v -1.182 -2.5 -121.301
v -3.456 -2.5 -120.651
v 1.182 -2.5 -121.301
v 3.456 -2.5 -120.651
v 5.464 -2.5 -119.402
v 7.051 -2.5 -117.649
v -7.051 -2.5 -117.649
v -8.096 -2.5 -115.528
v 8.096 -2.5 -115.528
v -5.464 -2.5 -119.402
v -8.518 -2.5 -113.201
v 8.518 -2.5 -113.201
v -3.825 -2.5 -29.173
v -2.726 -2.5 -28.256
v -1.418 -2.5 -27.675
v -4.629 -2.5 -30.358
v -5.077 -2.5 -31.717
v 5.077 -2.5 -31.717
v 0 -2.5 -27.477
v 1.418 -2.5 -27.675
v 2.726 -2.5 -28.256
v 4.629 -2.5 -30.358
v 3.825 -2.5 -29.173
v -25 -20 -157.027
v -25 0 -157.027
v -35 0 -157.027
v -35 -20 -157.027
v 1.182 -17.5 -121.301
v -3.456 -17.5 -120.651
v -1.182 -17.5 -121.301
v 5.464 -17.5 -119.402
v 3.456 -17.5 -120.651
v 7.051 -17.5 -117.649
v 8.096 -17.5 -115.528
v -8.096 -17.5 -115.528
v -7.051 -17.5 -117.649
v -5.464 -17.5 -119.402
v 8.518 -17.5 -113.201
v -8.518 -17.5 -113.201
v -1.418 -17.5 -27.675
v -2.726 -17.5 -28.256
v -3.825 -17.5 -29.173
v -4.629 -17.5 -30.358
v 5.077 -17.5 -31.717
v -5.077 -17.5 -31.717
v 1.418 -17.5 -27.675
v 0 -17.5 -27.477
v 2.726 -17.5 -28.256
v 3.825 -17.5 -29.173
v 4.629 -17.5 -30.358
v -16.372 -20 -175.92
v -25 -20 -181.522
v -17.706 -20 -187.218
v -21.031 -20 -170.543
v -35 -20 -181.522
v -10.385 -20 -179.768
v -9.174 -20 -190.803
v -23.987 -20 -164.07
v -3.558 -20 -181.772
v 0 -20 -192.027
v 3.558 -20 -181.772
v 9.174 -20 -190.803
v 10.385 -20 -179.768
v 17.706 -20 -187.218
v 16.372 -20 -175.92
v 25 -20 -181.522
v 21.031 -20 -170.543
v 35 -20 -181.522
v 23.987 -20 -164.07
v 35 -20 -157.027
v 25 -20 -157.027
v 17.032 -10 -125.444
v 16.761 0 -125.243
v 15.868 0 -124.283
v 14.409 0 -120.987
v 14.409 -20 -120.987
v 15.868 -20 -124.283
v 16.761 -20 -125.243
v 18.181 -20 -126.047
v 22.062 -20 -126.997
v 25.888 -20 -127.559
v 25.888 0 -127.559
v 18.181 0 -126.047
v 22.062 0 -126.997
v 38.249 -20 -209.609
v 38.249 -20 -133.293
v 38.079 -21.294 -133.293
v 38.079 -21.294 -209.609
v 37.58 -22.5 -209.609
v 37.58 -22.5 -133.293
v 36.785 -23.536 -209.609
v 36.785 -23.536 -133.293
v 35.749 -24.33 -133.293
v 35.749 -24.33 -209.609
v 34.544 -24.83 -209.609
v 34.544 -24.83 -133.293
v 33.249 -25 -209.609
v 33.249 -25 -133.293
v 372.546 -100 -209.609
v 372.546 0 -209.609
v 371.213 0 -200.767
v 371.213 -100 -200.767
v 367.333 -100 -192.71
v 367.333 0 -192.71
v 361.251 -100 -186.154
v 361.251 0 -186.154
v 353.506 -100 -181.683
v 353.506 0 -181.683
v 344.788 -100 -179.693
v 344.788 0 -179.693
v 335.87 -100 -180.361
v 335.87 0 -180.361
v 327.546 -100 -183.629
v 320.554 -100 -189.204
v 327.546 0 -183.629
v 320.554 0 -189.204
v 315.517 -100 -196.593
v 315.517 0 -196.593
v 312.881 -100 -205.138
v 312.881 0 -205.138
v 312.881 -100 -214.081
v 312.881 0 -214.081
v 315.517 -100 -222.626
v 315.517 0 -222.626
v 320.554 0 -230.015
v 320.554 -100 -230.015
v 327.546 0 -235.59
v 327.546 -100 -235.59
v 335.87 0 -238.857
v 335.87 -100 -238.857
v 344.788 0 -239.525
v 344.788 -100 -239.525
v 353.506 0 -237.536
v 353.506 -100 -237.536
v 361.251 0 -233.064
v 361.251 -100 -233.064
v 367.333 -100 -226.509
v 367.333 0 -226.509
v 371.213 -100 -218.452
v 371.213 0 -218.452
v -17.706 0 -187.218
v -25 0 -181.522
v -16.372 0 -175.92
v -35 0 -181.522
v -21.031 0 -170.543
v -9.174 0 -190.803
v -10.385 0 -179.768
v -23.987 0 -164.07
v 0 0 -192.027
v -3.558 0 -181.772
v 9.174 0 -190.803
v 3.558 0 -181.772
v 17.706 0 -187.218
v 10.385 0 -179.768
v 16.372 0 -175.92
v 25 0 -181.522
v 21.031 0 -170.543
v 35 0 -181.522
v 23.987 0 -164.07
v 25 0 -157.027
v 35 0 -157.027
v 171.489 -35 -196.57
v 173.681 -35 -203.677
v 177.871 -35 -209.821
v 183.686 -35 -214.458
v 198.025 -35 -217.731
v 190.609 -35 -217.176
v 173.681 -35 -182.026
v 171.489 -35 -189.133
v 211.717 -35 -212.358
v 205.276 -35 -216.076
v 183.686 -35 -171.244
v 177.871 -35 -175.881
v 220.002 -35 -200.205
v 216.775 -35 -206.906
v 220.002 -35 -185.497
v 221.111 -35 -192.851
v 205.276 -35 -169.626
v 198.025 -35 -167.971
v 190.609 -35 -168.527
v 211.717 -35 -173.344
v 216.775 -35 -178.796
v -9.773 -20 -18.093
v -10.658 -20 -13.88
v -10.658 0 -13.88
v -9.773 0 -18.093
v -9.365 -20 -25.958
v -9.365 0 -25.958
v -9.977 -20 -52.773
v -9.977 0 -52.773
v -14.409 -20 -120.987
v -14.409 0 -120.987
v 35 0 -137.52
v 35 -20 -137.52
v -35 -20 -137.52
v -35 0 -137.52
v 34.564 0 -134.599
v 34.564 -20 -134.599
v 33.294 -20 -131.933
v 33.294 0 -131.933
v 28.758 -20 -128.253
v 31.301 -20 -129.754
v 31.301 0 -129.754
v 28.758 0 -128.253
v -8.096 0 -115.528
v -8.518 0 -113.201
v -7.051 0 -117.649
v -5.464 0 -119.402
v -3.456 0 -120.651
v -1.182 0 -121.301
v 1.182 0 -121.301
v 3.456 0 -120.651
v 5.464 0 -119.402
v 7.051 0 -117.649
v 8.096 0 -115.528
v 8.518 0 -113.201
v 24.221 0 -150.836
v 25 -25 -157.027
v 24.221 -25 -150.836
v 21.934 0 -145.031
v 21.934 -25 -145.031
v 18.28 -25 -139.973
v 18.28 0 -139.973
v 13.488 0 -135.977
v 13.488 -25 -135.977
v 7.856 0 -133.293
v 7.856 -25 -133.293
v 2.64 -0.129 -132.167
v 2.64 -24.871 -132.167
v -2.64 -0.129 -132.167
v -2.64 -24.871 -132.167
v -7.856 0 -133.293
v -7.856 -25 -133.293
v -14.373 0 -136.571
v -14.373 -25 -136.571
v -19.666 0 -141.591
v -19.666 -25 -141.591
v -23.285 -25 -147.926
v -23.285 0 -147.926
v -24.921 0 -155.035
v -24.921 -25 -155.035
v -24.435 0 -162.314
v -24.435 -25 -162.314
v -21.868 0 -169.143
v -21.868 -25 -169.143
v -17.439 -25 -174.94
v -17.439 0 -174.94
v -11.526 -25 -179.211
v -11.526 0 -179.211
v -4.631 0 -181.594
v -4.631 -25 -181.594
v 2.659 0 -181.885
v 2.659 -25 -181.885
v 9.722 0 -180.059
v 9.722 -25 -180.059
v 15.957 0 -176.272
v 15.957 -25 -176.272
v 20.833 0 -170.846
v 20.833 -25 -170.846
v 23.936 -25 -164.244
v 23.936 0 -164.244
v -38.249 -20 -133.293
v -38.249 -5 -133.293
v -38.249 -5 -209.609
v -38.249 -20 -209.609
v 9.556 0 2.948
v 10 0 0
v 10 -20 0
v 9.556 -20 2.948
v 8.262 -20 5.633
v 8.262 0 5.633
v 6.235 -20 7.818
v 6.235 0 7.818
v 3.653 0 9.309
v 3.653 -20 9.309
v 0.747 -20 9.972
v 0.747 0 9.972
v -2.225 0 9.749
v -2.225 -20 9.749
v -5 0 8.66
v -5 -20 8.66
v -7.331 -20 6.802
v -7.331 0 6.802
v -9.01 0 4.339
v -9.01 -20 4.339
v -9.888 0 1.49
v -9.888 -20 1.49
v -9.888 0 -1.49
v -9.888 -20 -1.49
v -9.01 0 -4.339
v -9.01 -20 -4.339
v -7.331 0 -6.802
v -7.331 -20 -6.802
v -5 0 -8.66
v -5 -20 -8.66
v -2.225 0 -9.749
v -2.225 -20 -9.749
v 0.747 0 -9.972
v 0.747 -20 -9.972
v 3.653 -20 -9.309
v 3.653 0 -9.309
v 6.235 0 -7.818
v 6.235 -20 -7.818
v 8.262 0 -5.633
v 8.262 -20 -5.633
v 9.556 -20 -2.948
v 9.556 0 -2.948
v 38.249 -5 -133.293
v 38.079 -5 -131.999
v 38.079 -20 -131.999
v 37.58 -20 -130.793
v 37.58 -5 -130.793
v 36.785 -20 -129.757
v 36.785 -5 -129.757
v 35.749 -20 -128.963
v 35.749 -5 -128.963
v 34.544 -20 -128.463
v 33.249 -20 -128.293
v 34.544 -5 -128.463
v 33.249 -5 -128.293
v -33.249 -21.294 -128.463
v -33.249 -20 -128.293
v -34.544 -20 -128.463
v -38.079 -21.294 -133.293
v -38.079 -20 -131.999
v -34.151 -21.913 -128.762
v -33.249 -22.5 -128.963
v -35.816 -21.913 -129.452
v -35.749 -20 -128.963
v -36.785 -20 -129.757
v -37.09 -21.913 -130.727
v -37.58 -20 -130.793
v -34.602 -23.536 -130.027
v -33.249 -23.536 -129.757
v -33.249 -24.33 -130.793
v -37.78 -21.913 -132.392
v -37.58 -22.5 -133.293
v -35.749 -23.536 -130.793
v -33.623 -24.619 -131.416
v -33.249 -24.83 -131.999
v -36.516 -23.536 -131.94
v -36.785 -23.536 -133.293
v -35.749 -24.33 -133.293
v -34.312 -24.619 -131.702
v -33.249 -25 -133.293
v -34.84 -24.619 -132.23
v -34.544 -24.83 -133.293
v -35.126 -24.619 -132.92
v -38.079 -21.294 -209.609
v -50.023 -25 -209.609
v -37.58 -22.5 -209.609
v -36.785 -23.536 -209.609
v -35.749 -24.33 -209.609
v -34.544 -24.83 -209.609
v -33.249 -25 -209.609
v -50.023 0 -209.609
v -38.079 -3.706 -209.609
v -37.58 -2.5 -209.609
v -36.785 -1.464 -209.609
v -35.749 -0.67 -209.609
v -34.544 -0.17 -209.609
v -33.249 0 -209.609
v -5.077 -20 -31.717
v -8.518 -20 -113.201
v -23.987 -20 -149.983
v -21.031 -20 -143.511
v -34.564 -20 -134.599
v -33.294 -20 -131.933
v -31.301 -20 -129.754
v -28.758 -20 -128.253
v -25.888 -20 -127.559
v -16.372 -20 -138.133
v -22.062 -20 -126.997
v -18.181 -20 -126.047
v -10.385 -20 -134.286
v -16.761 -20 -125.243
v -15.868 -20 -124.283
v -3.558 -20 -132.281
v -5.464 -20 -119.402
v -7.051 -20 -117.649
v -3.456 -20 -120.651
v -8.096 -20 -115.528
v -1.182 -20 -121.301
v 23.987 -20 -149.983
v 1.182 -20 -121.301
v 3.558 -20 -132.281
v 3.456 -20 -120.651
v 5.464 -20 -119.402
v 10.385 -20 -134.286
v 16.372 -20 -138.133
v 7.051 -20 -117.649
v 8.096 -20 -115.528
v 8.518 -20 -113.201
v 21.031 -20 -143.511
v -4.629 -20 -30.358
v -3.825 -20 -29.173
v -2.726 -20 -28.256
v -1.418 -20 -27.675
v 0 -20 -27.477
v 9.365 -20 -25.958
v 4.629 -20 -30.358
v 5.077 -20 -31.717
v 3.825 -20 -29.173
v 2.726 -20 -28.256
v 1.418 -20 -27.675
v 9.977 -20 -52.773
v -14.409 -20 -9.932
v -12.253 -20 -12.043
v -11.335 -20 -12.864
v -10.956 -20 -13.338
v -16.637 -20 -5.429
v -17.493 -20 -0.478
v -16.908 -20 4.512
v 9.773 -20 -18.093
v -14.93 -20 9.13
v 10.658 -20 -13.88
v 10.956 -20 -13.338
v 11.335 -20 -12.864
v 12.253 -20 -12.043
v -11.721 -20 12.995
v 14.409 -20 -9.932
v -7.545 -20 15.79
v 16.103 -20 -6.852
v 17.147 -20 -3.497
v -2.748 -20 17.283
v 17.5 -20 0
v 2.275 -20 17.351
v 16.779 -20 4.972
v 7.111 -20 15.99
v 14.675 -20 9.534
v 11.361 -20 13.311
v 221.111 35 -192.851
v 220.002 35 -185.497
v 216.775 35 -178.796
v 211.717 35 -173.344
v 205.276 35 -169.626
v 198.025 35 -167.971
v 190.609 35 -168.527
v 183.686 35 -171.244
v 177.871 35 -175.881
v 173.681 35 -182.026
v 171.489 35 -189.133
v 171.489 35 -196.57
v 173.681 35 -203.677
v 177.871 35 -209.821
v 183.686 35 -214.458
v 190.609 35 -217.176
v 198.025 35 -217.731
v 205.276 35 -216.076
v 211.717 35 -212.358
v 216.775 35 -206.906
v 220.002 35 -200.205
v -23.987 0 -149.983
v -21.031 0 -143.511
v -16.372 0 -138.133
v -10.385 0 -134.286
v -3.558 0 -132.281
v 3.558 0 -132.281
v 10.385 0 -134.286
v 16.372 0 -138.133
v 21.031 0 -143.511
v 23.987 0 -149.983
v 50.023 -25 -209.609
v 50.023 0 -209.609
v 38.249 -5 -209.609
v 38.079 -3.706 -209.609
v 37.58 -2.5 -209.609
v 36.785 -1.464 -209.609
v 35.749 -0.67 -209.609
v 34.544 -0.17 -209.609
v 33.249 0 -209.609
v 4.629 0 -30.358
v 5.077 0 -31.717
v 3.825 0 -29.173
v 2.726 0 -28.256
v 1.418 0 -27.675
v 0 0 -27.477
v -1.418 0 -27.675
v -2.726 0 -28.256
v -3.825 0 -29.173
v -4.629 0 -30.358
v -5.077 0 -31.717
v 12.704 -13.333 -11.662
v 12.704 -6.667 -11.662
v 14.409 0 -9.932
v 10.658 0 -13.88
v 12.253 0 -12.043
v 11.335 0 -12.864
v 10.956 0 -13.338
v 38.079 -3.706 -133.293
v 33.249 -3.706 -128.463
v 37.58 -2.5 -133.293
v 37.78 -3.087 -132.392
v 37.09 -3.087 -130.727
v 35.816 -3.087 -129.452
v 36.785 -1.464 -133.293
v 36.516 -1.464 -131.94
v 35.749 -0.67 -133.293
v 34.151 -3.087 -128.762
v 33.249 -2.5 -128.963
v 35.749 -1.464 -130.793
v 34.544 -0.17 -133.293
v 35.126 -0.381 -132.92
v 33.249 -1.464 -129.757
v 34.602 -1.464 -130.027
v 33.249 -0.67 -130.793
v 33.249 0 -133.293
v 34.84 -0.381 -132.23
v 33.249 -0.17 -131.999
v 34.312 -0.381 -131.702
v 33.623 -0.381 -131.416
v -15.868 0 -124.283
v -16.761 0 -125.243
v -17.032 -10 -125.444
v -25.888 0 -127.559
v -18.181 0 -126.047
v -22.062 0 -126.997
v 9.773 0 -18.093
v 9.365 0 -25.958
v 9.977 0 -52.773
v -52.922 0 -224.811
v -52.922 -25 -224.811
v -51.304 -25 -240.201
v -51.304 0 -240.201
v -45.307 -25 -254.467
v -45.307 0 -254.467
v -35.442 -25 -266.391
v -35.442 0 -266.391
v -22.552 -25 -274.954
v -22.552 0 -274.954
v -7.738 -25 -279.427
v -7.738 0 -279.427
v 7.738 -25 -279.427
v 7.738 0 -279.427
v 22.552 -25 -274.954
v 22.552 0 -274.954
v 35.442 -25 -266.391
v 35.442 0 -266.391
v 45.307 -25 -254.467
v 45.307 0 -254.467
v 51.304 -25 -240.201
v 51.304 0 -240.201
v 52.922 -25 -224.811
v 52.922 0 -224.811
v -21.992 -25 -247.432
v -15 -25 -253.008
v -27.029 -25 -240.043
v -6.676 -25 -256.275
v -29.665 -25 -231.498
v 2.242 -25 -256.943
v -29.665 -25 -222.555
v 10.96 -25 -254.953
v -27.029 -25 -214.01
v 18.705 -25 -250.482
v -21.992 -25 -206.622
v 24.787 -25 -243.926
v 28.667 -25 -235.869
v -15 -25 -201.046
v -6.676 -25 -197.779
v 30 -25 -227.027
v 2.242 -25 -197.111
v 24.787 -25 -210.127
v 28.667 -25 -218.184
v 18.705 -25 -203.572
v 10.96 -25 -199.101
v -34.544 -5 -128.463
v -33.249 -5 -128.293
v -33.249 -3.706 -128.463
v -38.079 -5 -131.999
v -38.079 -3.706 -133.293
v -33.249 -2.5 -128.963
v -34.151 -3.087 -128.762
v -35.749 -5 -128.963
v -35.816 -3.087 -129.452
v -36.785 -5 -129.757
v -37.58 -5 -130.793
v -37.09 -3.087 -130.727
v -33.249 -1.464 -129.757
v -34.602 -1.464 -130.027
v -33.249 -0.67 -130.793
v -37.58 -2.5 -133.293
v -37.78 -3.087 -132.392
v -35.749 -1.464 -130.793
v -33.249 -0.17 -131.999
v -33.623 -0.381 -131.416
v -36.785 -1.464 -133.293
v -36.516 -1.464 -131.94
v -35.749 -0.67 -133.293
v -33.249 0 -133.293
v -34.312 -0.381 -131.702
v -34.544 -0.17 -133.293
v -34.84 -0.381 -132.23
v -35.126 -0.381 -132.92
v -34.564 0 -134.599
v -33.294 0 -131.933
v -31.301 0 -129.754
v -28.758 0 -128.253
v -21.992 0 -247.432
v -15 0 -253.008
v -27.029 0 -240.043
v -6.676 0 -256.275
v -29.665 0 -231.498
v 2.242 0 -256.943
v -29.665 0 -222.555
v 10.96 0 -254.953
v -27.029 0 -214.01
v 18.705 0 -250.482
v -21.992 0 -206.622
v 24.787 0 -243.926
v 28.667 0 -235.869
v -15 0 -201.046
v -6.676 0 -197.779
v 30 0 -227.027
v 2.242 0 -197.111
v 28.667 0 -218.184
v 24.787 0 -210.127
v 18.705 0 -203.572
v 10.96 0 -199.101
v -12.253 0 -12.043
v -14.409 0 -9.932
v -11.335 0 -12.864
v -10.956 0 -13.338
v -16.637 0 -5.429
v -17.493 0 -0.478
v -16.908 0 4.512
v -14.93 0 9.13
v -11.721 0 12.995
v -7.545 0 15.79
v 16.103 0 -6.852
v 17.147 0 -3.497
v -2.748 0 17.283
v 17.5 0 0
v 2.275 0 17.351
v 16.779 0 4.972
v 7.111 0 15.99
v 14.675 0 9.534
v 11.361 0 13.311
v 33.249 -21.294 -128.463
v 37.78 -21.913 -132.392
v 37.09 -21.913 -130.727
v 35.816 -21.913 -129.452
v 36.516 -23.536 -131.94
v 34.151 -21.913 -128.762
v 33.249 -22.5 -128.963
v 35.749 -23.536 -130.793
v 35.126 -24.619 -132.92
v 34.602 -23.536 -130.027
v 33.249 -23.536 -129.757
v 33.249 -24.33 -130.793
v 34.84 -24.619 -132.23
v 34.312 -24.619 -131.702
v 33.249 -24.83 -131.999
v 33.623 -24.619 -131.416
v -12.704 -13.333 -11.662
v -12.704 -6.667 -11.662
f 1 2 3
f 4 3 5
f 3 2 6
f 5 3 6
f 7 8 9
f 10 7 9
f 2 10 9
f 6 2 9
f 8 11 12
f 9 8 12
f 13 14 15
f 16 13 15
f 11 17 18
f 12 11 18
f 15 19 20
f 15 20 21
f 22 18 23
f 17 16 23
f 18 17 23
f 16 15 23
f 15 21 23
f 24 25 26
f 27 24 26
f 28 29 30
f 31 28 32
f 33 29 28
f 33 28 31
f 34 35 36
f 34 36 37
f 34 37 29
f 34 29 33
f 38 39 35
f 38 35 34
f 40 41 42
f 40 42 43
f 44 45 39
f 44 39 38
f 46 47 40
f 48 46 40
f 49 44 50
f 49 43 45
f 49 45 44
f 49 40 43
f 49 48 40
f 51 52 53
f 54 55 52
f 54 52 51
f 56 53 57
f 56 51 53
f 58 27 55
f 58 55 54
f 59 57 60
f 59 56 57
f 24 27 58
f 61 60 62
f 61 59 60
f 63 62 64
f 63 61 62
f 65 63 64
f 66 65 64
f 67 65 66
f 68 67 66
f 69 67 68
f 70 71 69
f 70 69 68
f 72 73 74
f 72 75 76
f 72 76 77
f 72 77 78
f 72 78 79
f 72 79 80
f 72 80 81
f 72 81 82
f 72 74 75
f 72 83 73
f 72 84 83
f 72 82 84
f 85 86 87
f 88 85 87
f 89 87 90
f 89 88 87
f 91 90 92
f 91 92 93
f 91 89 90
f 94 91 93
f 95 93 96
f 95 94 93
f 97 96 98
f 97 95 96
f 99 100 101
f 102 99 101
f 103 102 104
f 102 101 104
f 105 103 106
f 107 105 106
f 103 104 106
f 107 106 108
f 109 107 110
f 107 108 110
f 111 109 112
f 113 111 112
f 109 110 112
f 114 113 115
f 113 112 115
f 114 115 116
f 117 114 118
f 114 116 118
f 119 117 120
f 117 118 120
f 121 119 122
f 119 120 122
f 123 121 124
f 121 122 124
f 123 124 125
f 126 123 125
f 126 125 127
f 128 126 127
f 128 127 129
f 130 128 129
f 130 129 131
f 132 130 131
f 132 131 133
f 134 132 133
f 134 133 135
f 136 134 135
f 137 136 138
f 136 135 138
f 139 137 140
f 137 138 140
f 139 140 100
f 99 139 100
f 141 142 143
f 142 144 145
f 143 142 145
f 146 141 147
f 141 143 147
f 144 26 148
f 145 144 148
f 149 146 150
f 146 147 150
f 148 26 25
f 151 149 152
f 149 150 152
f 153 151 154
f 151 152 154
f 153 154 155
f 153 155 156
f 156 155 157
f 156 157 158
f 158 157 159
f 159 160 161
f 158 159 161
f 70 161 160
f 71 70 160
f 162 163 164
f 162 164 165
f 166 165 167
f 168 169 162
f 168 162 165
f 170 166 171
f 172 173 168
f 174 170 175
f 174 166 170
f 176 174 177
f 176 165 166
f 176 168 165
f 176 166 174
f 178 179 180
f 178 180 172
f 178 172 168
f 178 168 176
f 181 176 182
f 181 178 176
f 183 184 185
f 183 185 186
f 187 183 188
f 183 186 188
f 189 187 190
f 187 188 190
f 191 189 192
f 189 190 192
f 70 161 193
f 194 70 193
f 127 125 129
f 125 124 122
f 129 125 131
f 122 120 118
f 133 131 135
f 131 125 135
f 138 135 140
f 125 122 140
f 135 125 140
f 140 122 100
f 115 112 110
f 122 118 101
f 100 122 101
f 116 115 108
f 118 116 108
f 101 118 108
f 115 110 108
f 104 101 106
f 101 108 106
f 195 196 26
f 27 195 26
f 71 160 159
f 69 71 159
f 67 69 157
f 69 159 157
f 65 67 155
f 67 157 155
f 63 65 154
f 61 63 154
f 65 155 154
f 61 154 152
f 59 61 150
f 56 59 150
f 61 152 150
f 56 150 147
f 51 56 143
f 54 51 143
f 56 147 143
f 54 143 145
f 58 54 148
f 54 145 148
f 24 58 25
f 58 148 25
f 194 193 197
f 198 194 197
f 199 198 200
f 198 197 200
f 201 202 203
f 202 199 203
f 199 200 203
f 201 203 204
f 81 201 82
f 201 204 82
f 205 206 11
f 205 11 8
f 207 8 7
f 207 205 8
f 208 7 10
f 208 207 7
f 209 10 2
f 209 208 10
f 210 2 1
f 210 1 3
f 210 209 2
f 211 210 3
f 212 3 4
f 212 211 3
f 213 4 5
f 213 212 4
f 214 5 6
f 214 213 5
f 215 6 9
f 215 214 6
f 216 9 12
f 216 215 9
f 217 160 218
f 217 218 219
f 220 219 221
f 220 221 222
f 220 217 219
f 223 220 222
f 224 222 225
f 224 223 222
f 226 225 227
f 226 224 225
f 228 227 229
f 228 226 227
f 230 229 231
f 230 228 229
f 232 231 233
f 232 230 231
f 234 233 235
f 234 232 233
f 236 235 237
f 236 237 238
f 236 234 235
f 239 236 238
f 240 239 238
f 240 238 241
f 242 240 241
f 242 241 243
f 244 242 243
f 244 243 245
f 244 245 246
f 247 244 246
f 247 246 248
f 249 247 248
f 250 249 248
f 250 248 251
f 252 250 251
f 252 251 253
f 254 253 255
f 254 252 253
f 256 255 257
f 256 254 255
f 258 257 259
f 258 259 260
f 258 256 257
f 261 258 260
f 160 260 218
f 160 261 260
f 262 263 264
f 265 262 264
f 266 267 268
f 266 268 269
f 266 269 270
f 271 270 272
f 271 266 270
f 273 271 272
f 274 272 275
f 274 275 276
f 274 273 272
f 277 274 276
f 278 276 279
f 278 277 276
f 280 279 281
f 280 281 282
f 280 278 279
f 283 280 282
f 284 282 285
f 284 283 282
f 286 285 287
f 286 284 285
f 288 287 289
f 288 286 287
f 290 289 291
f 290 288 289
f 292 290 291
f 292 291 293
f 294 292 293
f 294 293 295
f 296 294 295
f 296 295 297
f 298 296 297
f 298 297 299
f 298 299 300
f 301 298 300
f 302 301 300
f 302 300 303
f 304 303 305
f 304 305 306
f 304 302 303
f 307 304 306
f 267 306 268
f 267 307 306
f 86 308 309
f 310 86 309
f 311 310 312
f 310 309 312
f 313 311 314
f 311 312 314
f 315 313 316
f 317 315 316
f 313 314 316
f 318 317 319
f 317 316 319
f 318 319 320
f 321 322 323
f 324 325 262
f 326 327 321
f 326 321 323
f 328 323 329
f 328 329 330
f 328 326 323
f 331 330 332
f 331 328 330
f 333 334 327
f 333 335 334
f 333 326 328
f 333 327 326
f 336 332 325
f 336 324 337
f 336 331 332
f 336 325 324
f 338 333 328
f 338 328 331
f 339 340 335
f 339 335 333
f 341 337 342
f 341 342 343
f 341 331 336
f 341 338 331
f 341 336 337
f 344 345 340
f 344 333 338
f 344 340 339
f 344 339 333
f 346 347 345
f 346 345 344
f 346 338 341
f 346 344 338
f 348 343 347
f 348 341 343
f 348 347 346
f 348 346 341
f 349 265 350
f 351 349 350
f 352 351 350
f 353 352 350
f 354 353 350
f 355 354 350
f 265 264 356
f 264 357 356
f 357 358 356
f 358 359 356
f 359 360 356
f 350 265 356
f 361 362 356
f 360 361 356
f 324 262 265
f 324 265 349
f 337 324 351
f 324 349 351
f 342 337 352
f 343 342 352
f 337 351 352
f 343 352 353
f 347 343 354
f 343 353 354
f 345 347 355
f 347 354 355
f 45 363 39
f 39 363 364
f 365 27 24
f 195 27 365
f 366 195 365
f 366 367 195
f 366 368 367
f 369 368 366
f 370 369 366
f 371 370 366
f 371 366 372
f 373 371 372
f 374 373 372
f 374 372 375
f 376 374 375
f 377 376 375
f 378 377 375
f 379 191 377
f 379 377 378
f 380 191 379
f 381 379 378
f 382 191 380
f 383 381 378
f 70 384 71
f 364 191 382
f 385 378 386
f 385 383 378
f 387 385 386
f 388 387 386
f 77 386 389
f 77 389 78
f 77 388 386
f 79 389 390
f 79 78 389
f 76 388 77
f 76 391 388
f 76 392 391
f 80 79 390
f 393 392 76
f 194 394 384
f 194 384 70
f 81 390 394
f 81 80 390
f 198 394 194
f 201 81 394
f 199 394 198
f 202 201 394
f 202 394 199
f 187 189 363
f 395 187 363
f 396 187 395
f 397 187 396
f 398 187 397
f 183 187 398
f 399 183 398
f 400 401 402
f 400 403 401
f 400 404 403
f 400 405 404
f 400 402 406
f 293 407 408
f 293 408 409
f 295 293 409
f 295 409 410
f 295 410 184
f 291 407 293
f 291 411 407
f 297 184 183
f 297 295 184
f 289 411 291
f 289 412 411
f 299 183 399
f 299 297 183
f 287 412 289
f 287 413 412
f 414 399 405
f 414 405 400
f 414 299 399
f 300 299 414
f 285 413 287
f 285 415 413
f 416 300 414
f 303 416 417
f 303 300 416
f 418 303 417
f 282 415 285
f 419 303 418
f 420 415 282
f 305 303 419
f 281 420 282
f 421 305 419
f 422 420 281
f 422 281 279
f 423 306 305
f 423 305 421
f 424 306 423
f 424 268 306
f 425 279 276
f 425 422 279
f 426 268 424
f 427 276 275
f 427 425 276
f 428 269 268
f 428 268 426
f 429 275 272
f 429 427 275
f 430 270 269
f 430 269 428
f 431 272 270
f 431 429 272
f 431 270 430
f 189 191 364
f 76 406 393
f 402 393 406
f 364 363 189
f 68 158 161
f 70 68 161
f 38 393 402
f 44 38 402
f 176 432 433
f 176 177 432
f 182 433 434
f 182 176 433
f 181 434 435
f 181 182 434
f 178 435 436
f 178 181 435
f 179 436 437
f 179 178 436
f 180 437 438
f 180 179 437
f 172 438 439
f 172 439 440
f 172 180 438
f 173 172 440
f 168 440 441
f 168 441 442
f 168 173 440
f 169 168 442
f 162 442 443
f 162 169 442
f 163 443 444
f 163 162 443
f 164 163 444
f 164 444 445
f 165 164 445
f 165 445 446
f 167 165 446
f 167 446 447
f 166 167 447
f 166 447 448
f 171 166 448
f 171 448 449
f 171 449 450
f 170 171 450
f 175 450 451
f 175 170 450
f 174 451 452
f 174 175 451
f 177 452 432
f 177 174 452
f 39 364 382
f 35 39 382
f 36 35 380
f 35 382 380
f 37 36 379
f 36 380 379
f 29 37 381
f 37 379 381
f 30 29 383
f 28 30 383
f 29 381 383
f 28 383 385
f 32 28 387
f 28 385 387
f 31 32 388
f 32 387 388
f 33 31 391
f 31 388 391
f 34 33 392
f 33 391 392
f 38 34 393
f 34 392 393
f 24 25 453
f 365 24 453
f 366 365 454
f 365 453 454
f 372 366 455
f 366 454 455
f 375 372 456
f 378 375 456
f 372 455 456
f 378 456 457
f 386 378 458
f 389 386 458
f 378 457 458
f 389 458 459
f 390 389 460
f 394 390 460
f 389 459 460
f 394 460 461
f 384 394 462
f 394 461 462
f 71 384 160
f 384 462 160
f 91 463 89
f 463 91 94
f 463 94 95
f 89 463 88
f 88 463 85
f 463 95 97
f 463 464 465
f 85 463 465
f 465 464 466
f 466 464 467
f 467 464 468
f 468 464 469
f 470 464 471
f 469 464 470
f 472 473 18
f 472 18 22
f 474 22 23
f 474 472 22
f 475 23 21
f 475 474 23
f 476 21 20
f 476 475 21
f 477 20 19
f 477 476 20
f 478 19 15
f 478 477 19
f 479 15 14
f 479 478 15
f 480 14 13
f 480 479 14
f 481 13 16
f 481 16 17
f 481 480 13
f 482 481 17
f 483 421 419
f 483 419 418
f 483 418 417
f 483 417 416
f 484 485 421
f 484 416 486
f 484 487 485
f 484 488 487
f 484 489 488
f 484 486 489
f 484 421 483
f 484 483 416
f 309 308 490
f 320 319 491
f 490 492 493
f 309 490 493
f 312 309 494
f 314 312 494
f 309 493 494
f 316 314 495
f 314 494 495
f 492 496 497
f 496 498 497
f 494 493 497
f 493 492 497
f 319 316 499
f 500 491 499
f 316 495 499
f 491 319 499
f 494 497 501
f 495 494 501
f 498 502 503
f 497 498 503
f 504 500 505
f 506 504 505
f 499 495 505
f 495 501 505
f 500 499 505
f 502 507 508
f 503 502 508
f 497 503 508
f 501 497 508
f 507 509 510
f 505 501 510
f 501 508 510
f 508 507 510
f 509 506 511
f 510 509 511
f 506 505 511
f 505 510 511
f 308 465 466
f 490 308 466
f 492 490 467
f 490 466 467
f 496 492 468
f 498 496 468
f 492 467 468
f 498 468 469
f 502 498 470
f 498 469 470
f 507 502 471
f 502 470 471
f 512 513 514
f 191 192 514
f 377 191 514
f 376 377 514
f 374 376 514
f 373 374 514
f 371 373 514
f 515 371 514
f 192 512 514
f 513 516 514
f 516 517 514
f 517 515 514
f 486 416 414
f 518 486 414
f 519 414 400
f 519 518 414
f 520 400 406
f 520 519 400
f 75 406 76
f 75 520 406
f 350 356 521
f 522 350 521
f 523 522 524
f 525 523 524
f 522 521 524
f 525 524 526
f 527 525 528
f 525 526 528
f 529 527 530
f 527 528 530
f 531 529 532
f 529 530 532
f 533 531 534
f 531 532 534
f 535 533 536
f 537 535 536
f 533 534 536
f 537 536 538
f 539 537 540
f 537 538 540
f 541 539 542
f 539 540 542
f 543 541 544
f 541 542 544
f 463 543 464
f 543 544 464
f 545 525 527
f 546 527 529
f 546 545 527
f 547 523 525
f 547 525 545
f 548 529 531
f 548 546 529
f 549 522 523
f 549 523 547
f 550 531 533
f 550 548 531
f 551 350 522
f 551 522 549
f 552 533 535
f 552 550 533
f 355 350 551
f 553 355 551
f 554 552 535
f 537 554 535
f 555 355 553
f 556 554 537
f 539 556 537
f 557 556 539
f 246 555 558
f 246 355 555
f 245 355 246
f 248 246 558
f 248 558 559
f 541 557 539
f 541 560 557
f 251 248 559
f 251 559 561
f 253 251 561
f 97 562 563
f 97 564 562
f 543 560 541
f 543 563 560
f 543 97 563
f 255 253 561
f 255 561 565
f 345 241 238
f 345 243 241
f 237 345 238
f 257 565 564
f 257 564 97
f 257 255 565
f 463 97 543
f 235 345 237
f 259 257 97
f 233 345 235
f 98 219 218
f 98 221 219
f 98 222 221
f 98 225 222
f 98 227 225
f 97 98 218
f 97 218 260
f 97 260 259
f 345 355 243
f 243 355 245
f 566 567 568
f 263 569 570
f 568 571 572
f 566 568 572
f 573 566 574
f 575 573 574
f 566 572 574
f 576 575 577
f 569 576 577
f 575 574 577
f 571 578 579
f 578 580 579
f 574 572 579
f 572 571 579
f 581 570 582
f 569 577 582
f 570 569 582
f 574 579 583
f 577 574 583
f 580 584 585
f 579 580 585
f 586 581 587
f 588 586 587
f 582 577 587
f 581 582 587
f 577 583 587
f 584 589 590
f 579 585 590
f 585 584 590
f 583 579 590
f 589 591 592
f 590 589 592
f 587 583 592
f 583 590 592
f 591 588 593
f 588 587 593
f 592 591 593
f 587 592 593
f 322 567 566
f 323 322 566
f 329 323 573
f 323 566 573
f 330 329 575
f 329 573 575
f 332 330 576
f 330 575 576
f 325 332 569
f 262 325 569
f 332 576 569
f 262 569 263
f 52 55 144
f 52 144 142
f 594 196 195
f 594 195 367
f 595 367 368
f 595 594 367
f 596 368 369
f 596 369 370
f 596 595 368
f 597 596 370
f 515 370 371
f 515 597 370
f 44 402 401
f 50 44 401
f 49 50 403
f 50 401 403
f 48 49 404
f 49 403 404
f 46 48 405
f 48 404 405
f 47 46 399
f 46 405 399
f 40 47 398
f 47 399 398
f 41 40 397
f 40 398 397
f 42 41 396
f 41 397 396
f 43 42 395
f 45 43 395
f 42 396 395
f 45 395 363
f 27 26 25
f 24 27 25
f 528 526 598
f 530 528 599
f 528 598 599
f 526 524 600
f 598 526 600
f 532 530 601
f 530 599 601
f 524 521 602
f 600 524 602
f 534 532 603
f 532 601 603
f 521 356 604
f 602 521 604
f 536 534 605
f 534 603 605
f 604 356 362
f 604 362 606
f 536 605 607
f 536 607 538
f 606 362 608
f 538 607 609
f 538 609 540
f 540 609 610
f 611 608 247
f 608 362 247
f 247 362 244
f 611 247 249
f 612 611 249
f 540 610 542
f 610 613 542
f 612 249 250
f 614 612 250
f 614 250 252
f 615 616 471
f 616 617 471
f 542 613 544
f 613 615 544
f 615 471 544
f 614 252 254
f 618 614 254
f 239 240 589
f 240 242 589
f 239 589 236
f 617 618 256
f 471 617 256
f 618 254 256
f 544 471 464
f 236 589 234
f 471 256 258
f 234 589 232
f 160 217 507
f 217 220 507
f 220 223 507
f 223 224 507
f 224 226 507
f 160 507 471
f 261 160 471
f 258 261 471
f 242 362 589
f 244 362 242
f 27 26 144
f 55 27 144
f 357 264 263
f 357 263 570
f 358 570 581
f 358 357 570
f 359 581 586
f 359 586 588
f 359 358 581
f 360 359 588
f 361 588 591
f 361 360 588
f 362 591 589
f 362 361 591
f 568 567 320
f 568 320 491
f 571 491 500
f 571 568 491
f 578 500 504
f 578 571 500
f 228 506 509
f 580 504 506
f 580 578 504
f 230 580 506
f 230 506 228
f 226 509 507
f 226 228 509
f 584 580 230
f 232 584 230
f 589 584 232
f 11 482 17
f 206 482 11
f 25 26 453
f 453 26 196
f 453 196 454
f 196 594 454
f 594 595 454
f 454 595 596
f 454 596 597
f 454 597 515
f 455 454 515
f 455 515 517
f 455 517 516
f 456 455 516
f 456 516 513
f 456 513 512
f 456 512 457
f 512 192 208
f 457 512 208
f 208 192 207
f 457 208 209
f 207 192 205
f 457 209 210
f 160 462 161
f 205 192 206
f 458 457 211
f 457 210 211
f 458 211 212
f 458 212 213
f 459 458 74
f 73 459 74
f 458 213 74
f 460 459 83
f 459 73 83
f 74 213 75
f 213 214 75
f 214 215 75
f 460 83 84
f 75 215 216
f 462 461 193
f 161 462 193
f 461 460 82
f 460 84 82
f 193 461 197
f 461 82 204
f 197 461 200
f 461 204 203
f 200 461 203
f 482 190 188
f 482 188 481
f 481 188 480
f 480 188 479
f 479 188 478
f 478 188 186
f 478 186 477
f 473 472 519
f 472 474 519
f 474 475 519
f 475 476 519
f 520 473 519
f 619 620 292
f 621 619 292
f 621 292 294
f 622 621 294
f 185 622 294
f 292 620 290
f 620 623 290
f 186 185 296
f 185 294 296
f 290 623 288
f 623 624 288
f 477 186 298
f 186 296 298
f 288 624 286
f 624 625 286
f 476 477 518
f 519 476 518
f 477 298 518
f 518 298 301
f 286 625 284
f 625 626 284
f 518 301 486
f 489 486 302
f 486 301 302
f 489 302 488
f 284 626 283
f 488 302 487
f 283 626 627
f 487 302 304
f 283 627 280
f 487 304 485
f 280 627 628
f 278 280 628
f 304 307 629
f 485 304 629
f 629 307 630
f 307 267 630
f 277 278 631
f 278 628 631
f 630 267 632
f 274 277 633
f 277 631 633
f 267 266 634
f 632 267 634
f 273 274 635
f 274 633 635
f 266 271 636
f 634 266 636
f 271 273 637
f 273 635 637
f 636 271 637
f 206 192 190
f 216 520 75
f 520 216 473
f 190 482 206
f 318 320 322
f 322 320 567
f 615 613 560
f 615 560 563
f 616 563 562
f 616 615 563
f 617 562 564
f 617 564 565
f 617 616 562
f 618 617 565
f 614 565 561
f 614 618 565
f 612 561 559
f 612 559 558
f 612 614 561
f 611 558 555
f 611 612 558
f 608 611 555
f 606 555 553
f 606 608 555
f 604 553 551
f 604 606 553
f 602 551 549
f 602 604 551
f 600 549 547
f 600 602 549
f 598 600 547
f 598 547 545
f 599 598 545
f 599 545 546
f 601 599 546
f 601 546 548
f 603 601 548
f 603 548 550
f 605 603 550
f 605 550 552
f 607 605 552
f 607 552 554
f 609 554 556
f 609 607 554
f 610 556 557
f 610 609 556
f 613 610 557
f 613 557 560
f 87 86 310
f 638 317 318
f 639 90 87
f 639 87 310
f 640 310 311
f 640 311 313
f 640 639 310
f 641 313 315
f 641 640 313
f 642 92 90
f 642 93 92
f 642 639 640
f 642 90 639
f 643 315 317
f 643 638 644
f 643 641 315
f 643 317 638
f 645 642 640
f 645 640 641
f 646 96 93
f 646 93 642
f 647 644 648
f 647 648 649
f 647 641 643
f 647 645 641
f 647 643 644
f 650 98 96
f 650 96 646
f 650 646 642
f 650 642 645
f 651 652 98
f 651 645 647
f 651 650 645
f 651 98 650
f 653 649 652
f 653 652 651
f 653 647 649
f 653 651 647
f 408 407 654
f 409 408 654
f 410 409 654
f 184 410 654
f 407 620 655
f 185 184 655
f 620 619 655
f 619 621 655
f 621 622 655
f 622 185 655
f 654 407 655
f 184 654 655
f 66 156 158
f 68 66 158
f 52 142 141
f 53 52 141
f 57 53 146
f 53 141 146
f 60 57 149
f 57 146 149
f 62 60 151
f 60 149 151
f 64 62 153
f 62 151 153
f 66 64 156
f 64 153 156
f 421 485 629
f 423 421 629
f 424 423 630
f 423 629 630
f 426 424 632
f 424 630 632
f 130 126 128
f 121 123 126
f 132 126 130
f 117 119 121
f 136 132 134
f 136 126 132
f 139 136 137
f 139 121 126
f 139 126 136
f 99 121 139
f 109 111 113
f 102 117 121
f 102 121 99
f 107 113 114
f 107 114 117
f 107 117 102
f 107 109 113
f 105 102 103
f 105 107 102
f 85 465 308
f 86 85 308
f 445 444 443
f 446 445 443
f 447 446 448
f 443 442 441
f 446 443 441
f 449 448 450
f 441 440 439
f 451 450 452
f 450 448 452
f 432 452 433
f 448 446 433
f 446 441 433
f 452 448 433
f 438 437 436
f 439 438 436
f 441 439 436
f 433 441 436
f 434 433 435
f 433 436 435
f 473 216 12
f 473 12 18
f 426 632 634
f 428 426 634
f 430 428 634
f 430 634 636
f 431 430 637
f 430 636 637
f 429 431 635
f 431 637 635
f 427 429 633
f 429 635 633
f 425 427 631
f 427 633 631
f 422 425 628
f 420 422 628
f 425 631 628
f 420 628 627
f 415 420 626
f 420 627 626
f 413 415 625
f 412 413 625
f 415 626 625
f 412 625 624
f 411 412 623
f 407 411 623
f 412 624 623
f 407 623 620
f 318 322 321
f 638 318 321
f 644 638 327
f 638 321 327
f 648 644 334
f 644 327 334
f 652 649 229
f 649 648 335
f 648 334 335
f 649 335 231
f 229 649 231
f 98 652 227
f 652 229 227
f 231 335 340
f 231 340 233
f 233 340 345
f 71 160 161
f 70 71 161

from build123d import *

# Parameters (mm, degrees)
F0_R          = 10
F1_DEPTH      = 20
F3_DEPTH      = 20
F5_DEPTH      = 2.5
F7_DEPTH      = 2.5
F8_R          = 30
F8_R_2        = 25
F9_DEPTH      = 25
F10_R         = 24.95
F11_DEPTH     = 35
F12_R         = 30
F13_DEPTH     = 100
F14_T1_DEPTH  = 66.4988437295
F14_T3_DEPTH  = 76.3163360927
F14_T6_ANGLE  = 90
F14_T8_ANGLE  = 90
F14_T10_ANGLE = 90
F14_T12_ANGLE = 90
F15_T1_DEPTH  = 69.8025602819


# Not quite as in the source:
# - a fillet or chamfer that OpenCascade refuses, or shapes differently, is made with other operations: its cross-section is extruded or revolved along the edge and cut away or added


with BuildPart() as f1:
    # F0 (on Front) → F1 (new body)
    with BuildSketch(Plane.XZ):
        with BuildLine():
            ThreePointArc((10.657655781, -13.8803592624), (0, -17.5), (-10.657655781, -13.8803592624))
            add(Edge.make_bspline(
                [(-10.657655781, -13.8803592624), (-10.5697063214, -14.0734920796), (-7.4212070748, -22.3661273448), (-11.0149524319, -76.0143110226), (-14.4087837187, -120.986558497)],
                knots=[0.171455294, 0.171455294, 0.171455294, 0.171455294, 0.1930861601, 1, 1, 1, 1], degree=3))
            add(Edge.make_bspline(
                [(-14.4087837187, -120.986558497), (-15, -122.5373980972), (-16.0166076681, -126.7545271526), (-23.3016373721, -127.0844308904), (-25.8878060456, -127.5592148304)],
                knots=[0, 0, 0, 0, 0.4297687598, 1, 1, 1, 1], degree=3))
            Line((-25.8878060456, -127.5592148304), (-35, -127.5592148304))
            Line((-35, -127.5592148304), (-35, -157.0267379284))
            Line((-35, -157.0267379284), (-25, -157.0267379284))
            ThreePointArc((-25, -157.0267379284), (0, -132.0267379284), (25, -157.0267379284))
            Line((25, -157.0267379284), (35, -157.0267379284))
            Line((35, -157.0267379284), (35, -127.5592148304))
            Line((35, -127.5592148304), (25.8878060456, -127.5592148304))
            add(Edge.make_bspline(
                [(14.4087837187, -120.986558497), (15, -122.5373980972), (16.0166076681, -126.7545271526), (23.3016373721, -127.0844308904), (25.8878060456, -127.5592148304)],
                knots=[0, 0, 0, 0, 0.4297687598, 1, 1, 1, 1], degree=3))
            add(Edge.make_bspline(
                [(10.657655781, -13.8803592624), (10.5697063214, -14.0734920796), (7.4212070748, -22.3661273448), (11.0149524319, -76.0143110226), (14.4087837187, -120.986558497)],
                knots=[0.171455294, 0.171455294, 0.171455294, 0.171455294, 0.1930861601, 1, 1, 1, 1], degree=3))
        make_face()
        with BuildLine():
            ThreePointArc((14.4087837187, -9.9316137535), (16.7093344433, -5.2007828701), (17.5, 0))
            ThreePointArc((17.5, 0), (-5.2007828701, 16.7093344433), (-14.4087837187, -9.9316137535))
            add(Edge.make_bspline(
                [(-14.4087837187, -9.9316137535), (-12.4132538877, -12.2865411794), (-11.3547799907, -12.3495077572), (-10.657655781, -13.8803592624)],
                knots=[0, 0, 0, 0, 0.171455294, 0.171455294, 0.171455294, 0.171455294], degree=3))
            ThreePointArc((-10.657655781, -13.8803592624), (0, -17.5), (10.657655781, -13.8803592624))
            add(Edge.make_bspline(
                [(14.4087837187, -9.9316137535), (12.4132538877, -12.2865411794), (11.3547799907, -12.3495077572), (10.657655781, -13.8803592624)],
                knots=[0, 0, 0, 0, 0.171455294, 0.171455294, 0.171455294, 0.171455294], degree=3))
        make_face()
        Circle(F0_R, mode=Mode.SUBTRACT)
    extrude(amount=F1_DEPTH)

    # F4 (on face) → F5 (cut)
    with BuildSketch(Plane.XZ.offset(20)):
        with BuildLine():
            Line((8.518111892, -113.2010370493), (5.076522479, -31.7173634542))
            ThreePointArc((5.076522479, -31.7173634542), (0, -27.4765780007), (-5.076522479, -31.7173634542))
            Line((-5.076522479, -31.7173634542), (-8.518111892, -113.2010370493))
            ThreePointArc((-8.518111892, -113.2010370493), (0, -121.3833500151), (8.518111892, -113.2010370493))
        make_face()
    extrude(amount=-F5_DEPTH, mode=Mode.SUBTRACT)

    # F6 (on face) → F7 (cut)
    with BuildSketch(Plane.XZ):
        with BuildLine():
            Line((8.518111892, -113.2010370493), (5.076522479, -31.7173634542))
            ThreePointArc((5.076522479, -31.7173634542), (0, -27.4765780007), (-5.076522479, -31.7173634542))
            Line((-5.076522479, -31.7173634542), (-8.518111892, -113.2010370493))
            ThreePointArc((-8.518111892, -113.2010370493), (0, -121.3833500151), (8.518111892, -113.2010370493))
        make_face()
    extrude(amount=F7_DEPTH, mode=Mode.SUBTRACT)

    # F15: fillet of radius 10 on 2 edges, made by hand

    # F15_s2 → F15_t1 (cut)
    with BuildSketch(Plane.XZ.offset(-24.901280141)):
        with BuildLine():
            ThreePointArc((35, -137.5197268868), (32.3782809806, -130.769840238), (25.8878060456, -127.5592148304))
            Line((25.8878060456, -127.5592148304), (35, -127.5592148304))
            Line((35, -127.5592148304), (35, -137.5197268868))
        make_face()
        with BuildLine():
            ThreePointArc((-35, -137.5197268868), (-32.3782809806, -130.769840238), (-25.8878060456, -127.5592148304))
            Line((-25.8878060456, -127.5592148304), (-35, -127.5592148304))
            Line((-35, -127.5592148304), (-35, -137.5197268868))
        make_face()
    extrude(amount=F15_T1_DEPTH, mode=Mode.SUBTRACT)


with BuildPart() as f3:
    # F2 (on Front) → F3 (new body)
    with BuildSketch(Plane.XZ):
        with BuildLine():
            ThreePointArc((25, -157.0267379284), (0, -182.0267379284), (-25, -157.0267379284))
            Line((-25, -157.0267379284), (-35, -157.0267379284))
            ThreePointArc((-35, -157.0267379284), (-32.403703492, -170.2554944837), (-25, -181.5216353562))
            ThreePointArc((-25, -181.5216353562), (0, -192.0267379284), (25, -181.5216353562))
            ThreePointArc((25, -181.5216353562), (32.403703492, -170.2554944837), (35, -157.0267379284))
            Line((35, -157.0267379284), (25, -157.0267379284))
        make_face()
        with BuildLine():
            ThreePointArc((-25, -181.5216353562), (-32.403703492, -170.2554944837), (-35, -157.0267379284))
            Line((-35, -157.0267379284), (-35, -181.5216353562))
            Line((-35, -181.5216353562), (-25, -181.5216353562))
        make_face()
        with BuildLine():
            Line((35, -181.5216353562), (35, -157.0267379284))
            ThreePointArc((35, -157.0267379284), (32.403703492, -170.2554944837), (25, -181.5216353562))
            Line((25, -181.5216353562), (35, -181.5216353562))
        make_face()
    extrude(amount=F3_DEPTH)


with BuildPart() as f9:
    # F8 (on Front) → F9 (new body)
    with BuildSketch(Plane.XZ):
        with BuildLine():
            ThreePointArc((38.2494218647, -133.2929936077), (36.7849557707, -129.7574597018), (33.2494218647, -128.2929936077))
            Line((33.2494218647, -128.2929936077), (-33.2494218647, -128.2929936077))
            ThreePointArc((-33.2494218647, -128.2929936077), (-36.7849557707, -129.7574597018), (-38.2494218647, -133.2929936077))
            Line((-38.2494218647, -133.2929936077), (-38.2494218647, -209.6093297005))
            Line((-38.2494218647, -209.6093297005), (-50.0230118632, -209.6093297005))
            ThreePointArc((-50.0230118632, -209.6093297005), (0, -279.9952929894), (50.0230118632, -209.6093297005))
            Line((50.0230118632, -209.6093297005), (38.2494218647, -209.6093297005))
            Line((38.2494218647, -209.6093297005), (38.2494218647, -133.2929936077))
        make_face()
        with Locations((0, -227.0267379284)):
            Circle(F8_R, mode=Mode.SUBTRACT)
        with Locations((0, -157.0267379284)):
            Circle(F8_R_2, mode=Mode.SUBTRACT)
    extrude(amount=F9_DEPTH)

    # F14: fillet of radius 5 on 10 edges, made by hand

    # F14_s2 → F14_t1 (cut)
    with BuildSketch(Plane.YZ.offset(-33.2494218647)):
        with BuildLine():
            ThreePointArc((-5, -128.2929936077), (-1.4644660941, -129.7574597018), (0, -133.2929936077))
            Line((0, -133.2929936077), (0, -128.2929936077))
            Line((0, -128.2929936077), (-5, -128.2929936077))
        make_face()
        with BuildLine():
            ThreePointArc((-20, -128.2929936077), (-23.5355339059, -129.7574597018), (-25, -133.2929936077))
            Line((-25, -133.2929936077), (-25, -128.2929936077))
            Line((-25, -128.2929936077), (-20, -128.2929936077))
        make_face()
    extrude(amount=F14_T1_DEPTH, mode=Mode.SUBTRACT)

    # F14_s4 → F14_t3 (cut)
    with BuildSketch(Plane.XY.offset(-209.6093297005)):
        with BuildLine():
            ThreePointArc((38.2494218647, -5), (36.7849557707, -1.4644660941), (33.2494218647, 0))
            Line((33.2494218647, 0), (38.2494218647, 0))
            Line((38.2494218647, 0), (38.2494218647, -5))
        make_face()
        with BuildLine():
            ThreePointArc((38.2494218647, -20), (36.7849557707, -23.5355339059), (33.2494218647, -25))
            Line((33.2494218647, -25), (38.2494218647, -25))
            Line((38.2494218647, -25), (38.2494218647, -20))
        make_face()
        with BuildLine():
            ThreePointArc((-38.2494218647, -5), (-36.7849557707, -1.4644660941), (-33.2494218647, 0))
            Line((-33.2494218647, 0), (-38.2494218647, 0))
            Line((-38.2494218647, 0), (-38.2494218647, -5))
        make_face()
        with BuildLine():
            ThreePointArc((-38.2494218647, -20), (-36.7849557707, -23.5355339059), (-33.2494218647, -25))
            Line((-33.2494218647, -25), (-38.2494218647, -25))
            Line((-38.2494218647, -25), (-38.2494218647, -20))
        make_face()
    extrude(amount=F14_T3_DEPTH, mode=Mode.SUBTRACT)

    # F14_s5 → F14_t6 (revolve, cut)
    with BuildSketch(Plane.YZ.offset(-33.2494218647)):
        with BuildLine():
            ThreePointArc((-20, -128.2929936077), (-23.5355339059, -129.7574597018), (-25, -133.2929936077))
            Line((-25, -133.2929936077), (-25, -128.2929936077))
            Line((-25, -128.2929936077), (-20, -128.2929936077))
        make_face()
    revolve(axis=Axis((-33.2494218647, -25, -133.2929936077), (0, -1, 0)), revolution_arc=F14_T6_ANGLE, mode=Mode.SUBTRACT)

    # F14_s7 → F14_t8 (revolve, cut)
    with BuildSketch(Plane.XY.offset(-133.2929936077)):
        with BuildLine():
            ThreePointArc((38.2494218647, -5), (36.7849557707, -1.4644660941), (33.2494218647, 0))
            Line((33.2494218647, 0), (38.2494218647, 0))
            Line((38.2494218647, 0), (38.2494218647, -5))
        make_face()
    revolve(axis=Axis((33.2494218647, 0, -133.2929936077), (0, -1, 0)), revolution_arc=F14_T8_ANGLE, mode=Mode.SUBTRACT)

    # F14_s9 → F14_t10 (revolve, cut)
    with BuildSketch(Plane.XY.offset(-133.2929936077)):
        with BuildLine():
            ThreePointArc((38.2494218647, -20), (36.7849557707, -23.5355339059), (33.2494218647, -25))
            Line((33.2494218647, -25), (38.2494218647, -25))
            Line((38.2494218647, -25), (38.2494218647, -20))
        make_face()
    revolve(axis=Axis((33.2494218647, -25, -133.2929936077), (0, -1, 0)), revolution_arc=F14_T10_ANGLE, mode=Mode.SUBTRACT)

    # F14_s11 → F14_t12 (revolve, cut)
    with BuildSketch(Plane.YZ.offset(-33.2494218647)):
        with BuildLine():
            ThreePointArc((-5, -128.2929936077), (-1.4644660941, -129.7574597018), (0, -133.2929936077))
            Line((0, -133.2929936077), (0, -128.2929936077))
            Line((0, -128.2929936077), (-5, -128.2929936077))
        make_face()
    revolve(axis=Axis((-33.2494218647, 0, -133.2929936077), (0, -1, 0)), revolution_arc=F14_T12_ANGLE, mode=Mode.SUBTRACT)


with BuildPart() as f11:
    # F10 (on Front) → F11 (new body, symmetric)
    with BuildSketch(Plane.XZ):
        with Locations((196.160569787, -192.8511559963)):
            Circle(F10_R)
    extrude(amount=F11_DEPTH, both=True)


with BuildPart() as f13:
    # F12 (on Front) → F13 (new body)
    with BuildSketch(Plane.XZ):
        with Locations((342.5459861755, -209.6093297005)):
            Circle(F12_R)
    extrude(amount=F13_DEPTH)


solid = Compound([f1.part, f3.part, f9.part, f11.part, f13.part])
